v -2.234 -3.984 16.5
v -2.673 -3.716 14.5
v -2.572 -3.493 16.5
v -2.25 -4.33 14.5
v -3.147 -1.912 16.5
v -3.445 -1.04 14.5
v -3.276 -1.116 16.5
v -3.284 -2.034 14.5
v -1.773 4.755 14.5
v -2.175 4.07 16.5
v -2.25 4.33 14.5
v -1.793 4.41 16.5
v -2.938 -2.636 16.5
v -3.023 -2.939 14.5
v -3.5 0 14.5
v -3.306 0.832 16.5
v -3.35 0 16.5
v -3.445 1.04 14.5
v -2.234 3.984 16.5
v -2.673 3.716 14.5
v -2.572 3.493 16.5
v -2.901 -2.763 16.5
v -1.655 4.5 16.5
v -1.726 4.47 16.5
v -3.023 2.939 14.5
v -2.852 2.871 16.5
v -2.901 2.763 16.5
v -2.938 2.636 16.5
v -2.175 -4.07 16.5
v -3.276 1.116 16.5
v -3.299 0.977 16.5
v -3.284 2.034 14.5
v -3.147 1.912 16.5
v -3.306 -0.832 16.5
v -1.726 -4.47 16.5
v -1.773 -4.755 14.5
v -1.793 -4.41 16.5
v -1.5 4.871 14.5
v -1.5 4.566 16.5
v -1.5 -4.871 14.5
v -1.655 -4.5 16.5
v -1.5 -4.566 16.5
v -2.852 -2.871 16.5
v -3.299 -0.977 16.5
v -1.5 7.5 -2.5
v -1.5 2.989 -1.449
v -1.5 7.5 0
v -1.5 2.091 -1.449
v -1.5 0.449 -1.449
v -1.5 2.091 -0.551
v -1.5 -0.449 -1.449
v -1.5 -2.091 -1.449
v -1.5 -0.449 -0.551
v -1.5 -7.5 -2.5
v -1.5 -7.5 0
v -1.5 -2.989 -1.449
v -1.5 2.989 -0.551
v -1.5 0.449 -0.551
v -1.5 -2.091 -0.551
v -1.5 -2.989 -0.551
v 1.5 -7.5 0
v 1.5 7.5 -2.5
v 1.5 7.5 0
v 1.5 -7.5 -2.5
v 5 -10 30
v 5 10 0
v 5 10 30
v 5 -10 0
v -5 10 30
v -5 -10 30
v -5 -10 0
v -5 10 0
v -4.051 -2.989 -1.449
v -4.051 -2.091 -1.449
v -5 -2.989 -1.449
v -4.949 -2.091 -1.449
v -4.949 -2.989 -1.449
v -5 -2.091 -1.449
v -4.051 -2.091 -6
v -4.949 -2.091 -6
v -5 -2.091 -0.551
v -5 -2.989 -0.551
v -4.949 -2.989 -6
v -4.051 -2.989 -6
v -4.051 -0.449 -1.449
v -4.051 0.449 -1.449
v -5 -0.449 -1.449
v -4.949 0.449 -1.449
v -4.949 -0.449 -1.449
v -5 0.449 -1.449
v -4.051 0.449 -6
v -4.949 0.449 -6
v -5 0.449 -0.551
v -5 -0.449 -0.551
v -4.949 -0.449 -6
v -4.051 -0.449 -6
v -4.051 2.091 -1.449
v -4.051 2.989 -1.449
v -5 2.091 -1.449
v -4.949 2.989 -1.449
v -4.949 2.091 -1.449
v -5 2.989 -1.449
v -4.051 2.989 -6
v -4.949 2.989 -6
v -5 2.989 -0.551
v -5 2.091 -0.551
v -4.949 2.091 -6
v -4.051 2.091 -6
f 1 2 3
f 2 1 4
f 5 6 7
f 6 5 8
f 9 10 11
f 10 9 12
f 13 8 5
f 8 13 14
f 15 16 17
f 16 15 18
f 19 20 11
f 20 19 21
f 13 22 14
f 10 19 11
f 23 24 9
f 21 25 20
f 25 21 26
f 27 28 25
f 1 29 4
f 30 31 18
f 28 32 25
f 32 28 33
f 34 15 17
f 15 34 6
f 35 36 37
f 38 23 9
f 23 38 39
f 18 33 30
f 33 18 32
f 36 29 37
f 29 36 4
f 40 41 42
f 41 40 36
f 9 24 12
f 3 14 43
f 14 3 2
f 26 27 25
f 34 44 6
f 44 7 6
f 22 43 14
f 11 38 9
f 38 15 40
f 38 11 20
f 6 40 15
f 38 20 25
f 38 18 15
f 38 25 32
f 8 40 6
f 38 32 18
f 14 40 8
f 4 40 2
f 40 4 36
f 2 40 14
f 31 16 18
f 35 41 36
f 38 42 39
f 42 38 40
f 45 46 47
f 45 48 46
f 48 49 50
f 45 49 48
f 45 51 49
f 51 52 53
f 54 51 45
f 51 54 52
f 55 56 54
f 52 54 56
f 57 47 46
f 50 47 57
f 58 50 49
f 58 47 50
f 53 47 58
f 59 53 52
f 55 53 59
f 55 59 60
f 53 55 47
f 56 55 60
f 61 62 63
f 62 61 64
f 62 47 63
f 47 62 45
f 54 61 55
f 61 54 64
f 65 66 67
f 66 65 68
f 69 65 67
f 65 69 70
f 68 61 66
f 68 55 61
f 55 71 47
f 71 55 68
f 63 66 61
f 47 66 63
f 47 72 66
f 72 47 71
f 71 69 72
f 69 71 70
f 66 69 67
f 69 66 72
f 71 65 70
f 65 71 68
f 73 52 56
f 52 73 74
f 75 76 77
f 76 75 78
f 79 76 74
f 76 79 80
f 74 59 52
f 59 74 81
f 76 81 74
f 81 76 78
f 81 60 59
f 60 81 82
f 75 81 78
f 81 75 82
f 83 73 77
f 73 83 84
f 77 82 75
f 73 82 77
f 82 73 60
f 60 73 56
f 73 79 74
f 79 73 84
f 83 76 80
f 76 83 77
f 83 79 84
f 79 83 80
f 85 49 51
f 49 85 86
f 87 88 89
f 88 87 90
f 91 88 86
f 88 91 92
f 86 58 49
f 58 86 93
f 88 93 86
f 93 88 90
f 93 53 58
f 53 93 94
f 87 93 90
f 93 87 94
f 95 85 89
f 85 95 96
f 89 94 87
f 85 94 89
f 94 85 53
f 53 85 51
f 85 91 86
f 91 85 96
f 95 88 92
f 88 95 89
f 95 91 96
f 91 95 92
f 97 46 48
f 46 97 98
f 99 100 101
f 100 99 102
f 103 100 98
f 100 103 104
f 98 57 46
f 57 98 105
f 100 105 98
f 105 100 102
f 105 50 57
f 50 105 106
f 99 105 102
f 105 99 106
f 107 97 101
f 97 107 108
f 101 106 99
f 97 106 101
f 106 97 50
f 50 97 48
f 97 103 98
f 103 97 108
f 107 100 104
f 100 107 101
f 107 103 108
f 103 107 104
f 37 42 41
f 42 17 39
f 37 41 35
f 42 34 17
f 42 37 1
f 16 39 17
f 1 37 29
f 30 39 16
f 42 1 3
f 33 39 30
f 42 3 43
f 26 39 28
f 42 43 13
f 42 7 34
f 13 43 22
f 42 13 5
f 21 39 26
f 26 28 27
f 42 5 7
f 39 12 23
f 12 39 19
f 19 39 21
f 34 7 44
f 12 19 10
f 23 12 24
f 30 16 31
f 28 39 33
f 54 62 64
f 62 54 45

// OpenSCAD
inch = 25.4;

l = 19;
w = 15;
h = 3;
sep = (12.8 + 7.8)/2;
d = (12.8 - 7.8)/2;




module pin(){
  rotate([0, 0, 45])cylinder(d=inch/20, h=5, $fn=4);
  translate([0, 0, 4.5])rotate([0, -90, 0])rotate([0, 0, 45])cylinder(d=inch/20, h=5, $fn=4);
}

module led(){
  color("red")cube([2, 1, 1], center=true);
}

module assembly(){
  translate([l/2, 0, 1])rotate([0, 90, 0])scale([.5, 1, 1])cylinder(d1=10, d2=7, h=10, $fn=30);
  difference(){
    cube([l, w, h], center=true);
    //translate([7, sep/2, -5])cylinder(d=d, h=10, $fn=30);
    //translate([7, -sep/2, -5])cylinder(d=d, h=10, $fn=30);
  }
  translate([-8, -.1 * inch, 0])pin();
  translate([-8,   0 * inch, 0])pin();
  translate([-8, +.1 * inch, 0])pin();
  
  translate([2, 5, 1])led();
}

difference(){
  translate([0, 0, 15])cube([10, 20, 30], center=true);
  translate([0, 0, 5])rotate([0, -90, 0])
    assembly();
}
#translate([0, 0, 7])rotate([0, -90, 0])assembly();
